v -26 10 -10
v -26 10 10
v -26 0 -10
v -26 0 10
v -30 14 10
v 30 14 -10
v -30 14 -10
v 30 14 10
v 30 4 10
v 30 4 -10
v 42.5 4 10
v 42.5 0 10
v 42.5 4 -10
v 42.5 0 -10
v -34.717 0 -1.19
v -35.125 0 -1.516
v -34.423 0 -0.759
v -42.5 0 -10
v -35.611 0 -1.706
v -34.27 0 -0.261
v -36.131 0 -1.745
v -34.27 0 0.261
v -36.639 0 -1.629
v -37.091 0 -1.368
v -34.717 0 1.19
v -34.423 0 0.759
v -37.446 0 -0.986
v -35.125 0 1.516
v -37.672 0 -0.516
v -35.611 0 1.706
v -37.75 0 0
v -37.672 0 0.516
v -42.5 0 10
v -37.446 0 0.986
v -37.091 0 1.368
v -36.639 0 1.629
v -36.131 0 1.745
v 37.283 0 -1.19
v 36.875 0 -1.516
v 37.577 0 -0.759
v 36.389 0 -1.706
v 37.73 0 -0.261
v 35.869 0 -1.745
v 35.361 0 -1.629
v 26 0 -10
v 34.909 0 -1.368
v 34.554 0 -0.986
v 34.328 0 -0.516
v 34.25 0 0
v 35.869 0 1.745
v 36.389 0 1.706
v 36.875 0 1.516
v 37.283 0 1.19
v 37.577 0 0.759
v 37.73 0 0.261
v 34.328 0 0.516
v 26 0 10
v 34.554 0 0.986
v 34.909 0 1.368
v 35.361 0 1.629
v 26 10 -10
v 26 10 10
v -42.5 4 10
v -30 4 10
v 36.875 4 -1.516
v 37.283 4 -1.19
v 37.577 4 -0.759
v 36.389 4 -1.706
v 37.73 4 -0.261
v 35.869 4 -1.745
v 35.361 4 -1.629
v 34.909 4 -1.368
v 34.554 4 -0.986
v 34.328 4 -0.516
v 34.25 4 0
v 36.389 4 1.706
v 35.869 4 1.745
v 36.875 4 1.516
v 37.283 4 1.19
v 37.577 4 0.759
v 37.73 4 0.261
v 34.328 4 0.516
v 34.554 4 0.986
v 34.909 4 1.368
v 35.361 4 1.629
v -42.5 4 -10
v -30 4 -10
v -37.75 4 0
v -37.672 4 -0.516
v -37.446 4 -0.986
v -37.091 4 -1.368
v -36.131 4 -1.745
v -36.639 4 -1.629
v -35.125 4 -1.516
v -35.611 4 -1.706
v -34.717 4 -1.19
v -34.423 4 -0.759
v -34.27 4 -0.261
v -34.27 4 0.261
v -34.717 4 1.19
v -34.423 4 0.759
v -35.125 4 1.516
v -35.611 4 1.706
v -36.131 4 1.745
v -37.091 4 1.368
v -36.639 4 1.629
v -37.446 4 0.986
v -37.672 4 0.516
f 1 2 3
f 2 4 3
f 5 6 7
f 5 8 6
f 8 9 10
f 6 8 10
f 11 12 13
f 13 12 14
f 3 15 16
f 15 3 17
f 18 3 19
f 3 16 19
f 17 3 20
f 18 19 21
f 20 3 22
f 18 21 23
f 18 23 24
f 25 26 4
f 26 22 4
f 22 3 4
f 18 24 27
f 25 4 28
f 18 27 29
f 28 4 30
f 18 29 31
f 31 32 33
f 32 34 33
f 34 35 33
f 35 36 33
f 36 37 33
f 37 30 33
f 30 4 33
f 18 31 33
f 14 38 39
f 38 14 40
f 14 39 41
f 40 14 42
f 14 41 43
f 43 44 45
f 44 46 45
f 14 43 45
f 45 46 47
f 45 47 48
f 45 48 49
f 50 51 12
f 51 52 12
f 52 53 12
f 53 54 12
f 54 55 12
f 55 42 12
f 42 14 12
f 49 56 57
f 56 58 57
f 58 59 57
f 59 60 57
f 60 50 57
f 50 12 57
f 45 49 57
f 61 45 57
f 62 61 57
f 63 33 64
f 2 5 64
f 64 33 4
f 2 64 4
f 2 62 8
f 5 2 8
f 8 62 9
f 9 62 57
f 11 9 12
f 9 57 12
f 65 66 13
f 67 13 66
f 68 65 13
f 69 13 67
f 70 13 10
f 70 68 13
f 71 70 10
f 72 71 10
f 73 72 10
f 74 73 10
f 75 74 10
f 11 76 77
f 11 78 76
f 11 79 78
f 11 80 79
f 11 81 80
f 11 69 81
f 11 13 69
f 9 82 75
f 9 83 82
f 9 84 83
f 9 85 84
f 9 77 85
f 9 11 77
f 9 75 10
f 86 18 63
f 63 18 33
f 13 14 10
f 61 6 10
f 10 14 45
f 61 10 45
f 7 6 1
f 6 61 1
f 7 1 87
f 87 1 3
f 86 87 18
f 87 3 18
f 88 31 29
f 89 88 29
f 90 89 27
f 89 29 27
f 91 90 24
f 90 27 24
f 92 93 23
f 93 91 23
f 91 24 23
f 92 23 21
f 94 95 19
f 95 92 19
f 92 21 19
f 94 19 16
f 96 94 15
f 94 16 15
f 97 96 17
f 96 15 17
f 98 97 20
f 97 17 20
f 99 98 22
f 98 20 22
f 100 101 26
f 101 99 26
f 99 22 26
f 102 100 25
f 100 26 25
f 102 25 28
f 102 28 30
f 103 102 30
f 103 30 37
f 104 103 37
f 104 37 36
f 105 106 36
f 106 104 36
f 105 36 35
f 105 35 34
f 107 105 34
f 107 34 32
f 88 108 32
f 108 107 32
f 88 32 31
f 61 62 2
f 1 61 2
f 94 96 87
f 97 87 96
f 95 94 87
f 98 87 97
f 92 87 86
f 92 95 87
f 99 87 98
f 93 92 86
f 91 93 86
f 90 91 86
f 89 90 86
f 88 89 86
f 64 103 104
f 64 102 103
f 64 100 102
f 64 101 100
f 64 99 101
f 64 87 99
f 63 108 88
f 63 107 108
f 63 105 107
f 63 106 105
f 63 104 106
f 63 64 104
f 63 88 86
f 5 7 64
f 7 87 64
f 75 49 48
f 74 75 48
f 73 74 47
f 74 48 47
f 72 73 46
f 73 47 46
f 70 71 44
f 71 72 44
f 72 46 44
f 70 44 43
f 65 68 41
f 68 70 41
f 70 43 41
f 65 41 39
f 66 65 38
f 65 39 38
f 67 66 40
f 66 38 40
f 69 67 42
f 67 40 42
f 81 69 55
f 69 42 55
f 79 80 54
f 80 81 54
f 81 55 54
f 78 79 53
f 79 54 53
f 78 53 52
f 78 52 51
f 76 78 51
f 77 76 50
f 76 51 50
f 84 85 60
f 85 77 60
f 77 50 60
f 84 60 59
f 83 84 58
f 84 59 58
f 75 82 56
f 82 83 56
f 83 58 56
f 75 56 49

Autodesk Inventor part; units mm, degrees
ref_plane "YZ Plane" through (0, 0, 0) normal (1, 0, 0) x (0, 1, 0)
ref_plane "XZ Plane" through (0, 0, 0) normal (0, 1, 0) x (-1, 0, 0)
ref_plane "XY Plane" through (0, 0, 0) normal (0, 0, 1) x (1, 0, 0)
sketch "Sketch1" plane through (0, 0, 0) normal (0, 1, 0) x (-1, 0, 0)
  line L0 (-42.5, -10) -> (42.5, -10)
  line L1 (42.5, -10) -> (42.5, 10)
  line L2 (42.5, 10) -> (-42.5, 10)
  line L3 (-42.5, 10) -> (-42.5, -10)
  line L4 (-42.5, -10) -> (42.5, 10) construction
  line L5 (42.5, -10) -> (-42.5, 10) construction
  line L6 (-30, -10) -> (30, -10)
  line L7 (30, -10) -> (30, 10)
  line L8 (30, 10) -> (-30, 10)
  line L9 (-30, 10) -> (-30, -10)
  line L10 (-30, -10) -> (30, 10) construction
  line L11 (30, -10) -> (-30, 10) construction
  circle A0 centre (36, 0) radius 1.75
  circle A1 centre (-36, 0) radius 1.75
  line L12 (0, 10) -> (0, -10) construction
  line L13 (30, 10) -> (26, 10)
  line L14 (26, 10) -> (26, -10)
  line L15 (26, -10) -> (30, -10)
  line L16 (30, -10) -> (30, 10)
  line L17 (-30, -10) -> (-26, -10)
  line L18 (-26, -10) -> (-26, 10)
  line L19 (-26, 10) -> (-30, 10)
  line L20 (-30, 10) -> (-30, -10)
  point P0 (0, 0)
  point P1 (0, 0)
  dimension "d0" = 72
  dimension "d1" = 60
  dimension "d2" = 85
  dimension "d3" = 3.5
  dimension "d4" = 20
  dimension "d7" = 4
extrude "Extrusion1" add sketch "Sketch1" along normal blind 4 contours L3 L2 L9 L0 | L7 L2 L1 L0
extrude "Extrusion2" add sketch "Sketch1" along normal blind 10 contours L9 L2 L18 L0 | L14 L2 L7 L0
extrude "Extrusion3" add sketch "Sketch1" along normal blind 4 from surface at 10 contours L9 L2 L18 L0 | L18 L2 L14 L0 | L14 L2 L7 L0
properties part number "cable_protector"
